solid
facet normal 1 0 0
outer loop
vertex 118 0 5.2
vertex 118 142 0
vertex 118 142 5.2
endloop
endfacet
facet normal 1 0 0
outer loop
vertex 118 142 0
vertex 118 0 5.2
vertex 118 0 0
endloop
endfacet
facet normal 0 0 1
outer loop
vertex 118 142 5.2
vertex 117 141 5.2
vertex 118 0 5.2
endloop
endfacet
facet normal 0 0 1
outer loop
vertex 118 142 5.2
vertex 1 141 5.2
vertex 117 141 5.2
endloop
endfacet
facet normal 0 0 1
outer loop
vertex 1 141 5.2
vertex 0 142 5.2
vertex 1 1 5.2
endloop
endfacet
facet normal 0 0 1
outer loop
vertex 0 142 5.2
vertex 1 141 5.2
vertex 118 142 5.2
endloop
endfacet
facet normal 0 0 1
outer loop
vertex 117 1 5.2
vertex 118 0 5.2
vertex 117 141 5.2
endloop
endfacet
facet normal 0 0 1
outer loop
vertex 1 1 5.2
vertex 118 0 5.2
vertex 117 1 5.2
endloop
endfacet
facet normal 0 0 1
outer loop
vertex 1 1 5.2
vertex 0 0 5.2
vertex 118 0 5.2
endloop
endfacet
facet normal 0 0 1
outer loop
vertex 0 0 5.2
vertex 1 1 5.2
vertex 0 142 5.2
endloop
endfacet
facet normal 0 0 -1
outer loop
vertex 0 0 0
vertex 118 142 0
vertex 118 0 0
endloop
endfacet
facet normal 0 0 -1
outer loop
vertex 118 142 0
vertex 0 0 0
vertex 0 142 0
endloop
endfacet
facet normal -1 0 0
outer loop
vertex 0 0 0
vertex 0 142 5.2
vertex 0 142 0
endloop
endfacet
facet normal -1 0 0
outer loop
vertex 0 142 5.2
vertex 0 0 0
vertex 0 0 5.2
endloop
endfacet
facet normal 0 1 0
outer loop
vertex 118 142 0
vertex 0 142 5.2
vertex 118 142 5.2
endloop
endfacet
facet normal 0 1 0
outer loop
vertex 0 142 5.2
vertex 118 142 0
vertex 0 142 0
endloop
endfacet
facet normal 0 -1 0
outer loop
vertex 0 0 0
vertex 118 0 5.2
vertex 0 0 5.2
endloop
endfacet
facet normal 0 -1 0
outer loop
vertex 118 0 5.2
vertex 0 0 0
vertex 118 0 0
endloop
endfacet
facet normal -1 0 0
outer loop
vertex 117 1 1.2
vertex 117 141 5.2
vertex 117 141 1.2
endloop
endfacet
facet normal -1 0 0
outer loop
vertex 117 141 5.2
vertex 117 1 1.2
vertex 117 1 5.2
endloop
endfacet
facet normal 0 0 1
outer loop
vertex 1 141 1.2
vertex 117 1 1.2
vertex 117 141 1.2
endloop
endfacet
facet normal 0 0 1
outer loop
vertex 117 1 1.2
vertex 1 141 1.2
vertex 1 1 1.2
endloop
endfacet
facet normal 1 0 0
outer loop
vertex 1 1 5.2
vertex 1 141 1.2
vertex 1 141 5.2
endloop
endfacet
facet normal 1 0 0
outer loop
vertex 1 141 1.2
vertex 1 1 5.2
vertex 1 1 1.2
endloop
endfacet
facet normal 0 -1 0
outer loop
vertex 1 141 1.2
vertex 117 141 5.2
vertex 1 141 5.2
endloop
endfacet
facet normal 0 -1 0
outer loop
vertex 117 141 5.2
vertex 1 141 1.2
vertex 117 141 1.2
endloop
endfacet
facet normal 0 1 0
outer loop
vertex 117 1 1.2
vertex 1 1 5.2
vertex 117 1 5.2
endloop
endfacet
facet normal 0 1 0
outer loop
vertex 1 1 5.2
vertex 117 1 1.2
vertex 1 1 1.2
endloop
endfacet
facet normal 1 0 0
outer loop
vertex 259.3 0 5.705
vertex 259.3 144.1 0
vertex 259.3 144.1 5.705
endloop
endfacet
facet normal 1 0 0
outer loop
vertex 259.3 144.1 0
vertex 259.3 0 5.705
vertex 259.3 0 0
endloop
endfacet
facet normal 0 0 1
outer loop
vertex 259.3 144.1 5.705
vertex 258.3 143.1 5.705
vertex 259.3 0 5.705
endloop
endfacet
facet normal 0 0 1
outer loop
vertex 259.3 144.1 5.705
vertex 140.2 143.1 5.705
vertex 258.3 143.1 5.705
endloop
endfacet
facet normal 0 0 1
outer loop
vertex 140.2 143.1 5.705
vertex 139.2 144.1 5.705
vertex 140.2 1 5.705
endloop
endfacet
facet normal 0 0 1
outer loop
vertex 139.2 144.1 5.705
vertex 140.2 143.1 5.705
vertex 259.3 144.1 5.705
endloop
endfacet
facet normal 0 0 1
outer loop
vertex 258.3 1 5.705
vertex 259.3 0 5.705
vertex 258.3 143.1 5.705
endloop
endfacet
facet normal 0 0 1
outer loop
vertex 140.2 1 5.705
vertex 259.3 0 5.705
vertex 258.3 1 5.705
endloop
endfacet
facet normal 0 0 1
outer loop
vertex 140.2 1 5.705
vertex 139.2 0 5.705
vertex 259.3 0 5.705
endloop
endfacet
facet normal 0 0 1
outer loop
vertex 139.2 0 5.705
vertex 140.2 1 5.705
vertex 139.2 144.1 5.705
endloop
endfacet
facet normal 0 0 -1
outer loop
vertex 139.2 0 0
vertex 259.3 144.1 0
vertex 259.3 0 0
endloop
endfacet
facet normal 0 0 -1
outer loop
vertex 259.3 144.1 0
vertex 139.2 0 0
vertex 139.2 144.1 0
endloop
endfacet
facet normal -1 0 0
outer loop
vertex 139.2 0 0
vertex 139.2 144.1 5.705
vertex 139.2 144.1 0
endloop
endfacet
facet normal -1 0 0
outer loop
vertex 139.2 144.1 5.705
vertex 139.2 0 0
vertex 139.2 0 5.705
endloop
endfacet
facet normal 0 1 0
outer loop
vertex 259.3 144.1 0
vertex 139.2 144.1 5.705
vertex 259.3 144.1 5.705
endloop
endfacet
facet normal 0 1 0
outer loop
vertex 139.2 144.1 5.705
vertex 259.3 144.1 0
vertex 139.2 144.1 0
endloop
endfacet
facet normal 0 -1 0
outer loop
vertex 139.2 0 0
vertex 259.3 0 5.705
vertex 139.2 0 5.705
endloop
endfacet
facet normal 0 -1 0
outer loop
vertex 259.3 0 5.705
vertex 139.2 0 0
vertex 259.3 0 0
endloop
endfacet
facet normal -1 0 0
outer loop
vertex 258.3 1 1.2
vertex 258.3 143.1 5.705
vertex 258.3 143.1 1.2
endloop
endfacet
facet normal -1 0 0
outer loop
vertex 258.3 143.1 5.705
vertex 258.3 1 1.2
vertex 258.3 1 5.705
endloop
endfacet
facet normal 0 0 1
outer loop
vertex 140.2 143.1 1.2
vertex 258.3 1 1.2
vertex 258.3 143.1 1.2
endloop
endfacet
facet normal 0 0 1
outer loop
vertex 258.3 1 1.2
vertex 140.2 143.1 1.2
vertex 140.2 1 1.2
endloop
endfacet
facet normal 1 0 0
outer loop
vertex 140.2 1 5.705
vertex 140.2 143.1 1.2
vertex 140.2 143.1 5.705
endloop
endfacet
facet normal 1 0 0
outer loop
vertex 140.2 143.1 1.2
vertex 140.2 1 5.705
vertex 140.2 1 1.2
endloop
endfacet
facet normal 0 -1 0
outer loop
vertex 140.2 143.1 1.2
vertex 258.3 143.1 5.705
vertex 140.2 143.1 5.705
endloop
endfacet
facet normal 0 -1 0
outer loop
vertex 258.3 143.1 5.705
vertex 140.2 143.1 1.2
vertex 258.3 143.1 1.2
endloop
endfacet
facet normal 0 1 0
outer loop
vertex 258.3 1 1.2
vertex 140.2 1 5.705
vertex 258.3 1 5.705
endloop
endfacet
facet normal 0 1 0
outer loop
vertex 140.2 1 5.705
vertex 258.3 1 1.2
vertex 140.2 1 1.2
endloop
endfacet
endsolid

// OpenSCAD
/**
 * Box with overlapping lid
 *
 * I use this to store square filters for my photocamera. 
 * I print these in TPU for better protection, it also helps the lid
 * to stay on the box more firmly.
 *
 * Copyright Hendrik Busch, 2023
 */
 
 
/* [General settings] */
 
// The width of the object that is supposed to fit inside
Inner_Width = 116; // [30:0.1:200]

// The length of the object that is supposed to fit inside
Inner_Length = 140; // [30:0.1:200]
 
// The height of the object that is supposed to fit inside
Inner_Height = 4; // [1:0.1:40]

// Lid overlap percentage. I recommend to set this to at least 50%, for smaller object even higher.
Lid_Overlap = 85; // [5:5:100]

// Top/bottom wall thickness
Top_Bottom_Wall_Thickness = 1.2; // [0.2:0.1:5]

// Side wall thickness
Side_Wall_Thickness = 1; // [0.2:0.2:5]

/* [Fine tuning] */

// Gap between the box and the lid.
Lid_Gap = 0.1; // [0:0.1:1]

/* [Hidden] */
$fn = 128;
f = 0.01;
df = f*2;

module box_square(inner_width, inner_length, inner_height, bottom_wall_thickness, side_wall_thickness) {
    outer_width = inner_width + side_wall_thickness * 2;
    outer_length = inner_length + side_wall_thickness * 2;
    outer_height = inner_height + bottom_wall_thickness;
    
    difference() {
        cube([outer_width, outer_length, outer_height]);
        translate([side_wall_thickness, side_wall_thickness, bottom_wall_thickness])
            cube([inner_width, inner_length, inner_height + f]);
    }    
}

module box() {
    box_square(Inner_Width, Inner_Length, Inner_Height, Top_Bottom_Wall_Thickness, Side_Wall_Thickness);
}   

module lid() {
    lid_inner_width = Inner_Width + Side_Wall_Thickness*2 + Lid_Gap;
    lid_inner_length = Inner_Length + Side_Wall_Thickness*2 + Lid_Gap;
    lid_inner_height = (Lid_Overlap / 100) * (Inner_Height + Top_Bottom_Wall_Thickness + Lid_Gap); 
    box_square(lid_inner_width, lid_inner_length, lid_inner_height, Top_Bottom_Wall_Thickness, Side_Wall_Thickness);
}

box();
translate([Inner_Width * 1.2, 0, 0])
    lid();
